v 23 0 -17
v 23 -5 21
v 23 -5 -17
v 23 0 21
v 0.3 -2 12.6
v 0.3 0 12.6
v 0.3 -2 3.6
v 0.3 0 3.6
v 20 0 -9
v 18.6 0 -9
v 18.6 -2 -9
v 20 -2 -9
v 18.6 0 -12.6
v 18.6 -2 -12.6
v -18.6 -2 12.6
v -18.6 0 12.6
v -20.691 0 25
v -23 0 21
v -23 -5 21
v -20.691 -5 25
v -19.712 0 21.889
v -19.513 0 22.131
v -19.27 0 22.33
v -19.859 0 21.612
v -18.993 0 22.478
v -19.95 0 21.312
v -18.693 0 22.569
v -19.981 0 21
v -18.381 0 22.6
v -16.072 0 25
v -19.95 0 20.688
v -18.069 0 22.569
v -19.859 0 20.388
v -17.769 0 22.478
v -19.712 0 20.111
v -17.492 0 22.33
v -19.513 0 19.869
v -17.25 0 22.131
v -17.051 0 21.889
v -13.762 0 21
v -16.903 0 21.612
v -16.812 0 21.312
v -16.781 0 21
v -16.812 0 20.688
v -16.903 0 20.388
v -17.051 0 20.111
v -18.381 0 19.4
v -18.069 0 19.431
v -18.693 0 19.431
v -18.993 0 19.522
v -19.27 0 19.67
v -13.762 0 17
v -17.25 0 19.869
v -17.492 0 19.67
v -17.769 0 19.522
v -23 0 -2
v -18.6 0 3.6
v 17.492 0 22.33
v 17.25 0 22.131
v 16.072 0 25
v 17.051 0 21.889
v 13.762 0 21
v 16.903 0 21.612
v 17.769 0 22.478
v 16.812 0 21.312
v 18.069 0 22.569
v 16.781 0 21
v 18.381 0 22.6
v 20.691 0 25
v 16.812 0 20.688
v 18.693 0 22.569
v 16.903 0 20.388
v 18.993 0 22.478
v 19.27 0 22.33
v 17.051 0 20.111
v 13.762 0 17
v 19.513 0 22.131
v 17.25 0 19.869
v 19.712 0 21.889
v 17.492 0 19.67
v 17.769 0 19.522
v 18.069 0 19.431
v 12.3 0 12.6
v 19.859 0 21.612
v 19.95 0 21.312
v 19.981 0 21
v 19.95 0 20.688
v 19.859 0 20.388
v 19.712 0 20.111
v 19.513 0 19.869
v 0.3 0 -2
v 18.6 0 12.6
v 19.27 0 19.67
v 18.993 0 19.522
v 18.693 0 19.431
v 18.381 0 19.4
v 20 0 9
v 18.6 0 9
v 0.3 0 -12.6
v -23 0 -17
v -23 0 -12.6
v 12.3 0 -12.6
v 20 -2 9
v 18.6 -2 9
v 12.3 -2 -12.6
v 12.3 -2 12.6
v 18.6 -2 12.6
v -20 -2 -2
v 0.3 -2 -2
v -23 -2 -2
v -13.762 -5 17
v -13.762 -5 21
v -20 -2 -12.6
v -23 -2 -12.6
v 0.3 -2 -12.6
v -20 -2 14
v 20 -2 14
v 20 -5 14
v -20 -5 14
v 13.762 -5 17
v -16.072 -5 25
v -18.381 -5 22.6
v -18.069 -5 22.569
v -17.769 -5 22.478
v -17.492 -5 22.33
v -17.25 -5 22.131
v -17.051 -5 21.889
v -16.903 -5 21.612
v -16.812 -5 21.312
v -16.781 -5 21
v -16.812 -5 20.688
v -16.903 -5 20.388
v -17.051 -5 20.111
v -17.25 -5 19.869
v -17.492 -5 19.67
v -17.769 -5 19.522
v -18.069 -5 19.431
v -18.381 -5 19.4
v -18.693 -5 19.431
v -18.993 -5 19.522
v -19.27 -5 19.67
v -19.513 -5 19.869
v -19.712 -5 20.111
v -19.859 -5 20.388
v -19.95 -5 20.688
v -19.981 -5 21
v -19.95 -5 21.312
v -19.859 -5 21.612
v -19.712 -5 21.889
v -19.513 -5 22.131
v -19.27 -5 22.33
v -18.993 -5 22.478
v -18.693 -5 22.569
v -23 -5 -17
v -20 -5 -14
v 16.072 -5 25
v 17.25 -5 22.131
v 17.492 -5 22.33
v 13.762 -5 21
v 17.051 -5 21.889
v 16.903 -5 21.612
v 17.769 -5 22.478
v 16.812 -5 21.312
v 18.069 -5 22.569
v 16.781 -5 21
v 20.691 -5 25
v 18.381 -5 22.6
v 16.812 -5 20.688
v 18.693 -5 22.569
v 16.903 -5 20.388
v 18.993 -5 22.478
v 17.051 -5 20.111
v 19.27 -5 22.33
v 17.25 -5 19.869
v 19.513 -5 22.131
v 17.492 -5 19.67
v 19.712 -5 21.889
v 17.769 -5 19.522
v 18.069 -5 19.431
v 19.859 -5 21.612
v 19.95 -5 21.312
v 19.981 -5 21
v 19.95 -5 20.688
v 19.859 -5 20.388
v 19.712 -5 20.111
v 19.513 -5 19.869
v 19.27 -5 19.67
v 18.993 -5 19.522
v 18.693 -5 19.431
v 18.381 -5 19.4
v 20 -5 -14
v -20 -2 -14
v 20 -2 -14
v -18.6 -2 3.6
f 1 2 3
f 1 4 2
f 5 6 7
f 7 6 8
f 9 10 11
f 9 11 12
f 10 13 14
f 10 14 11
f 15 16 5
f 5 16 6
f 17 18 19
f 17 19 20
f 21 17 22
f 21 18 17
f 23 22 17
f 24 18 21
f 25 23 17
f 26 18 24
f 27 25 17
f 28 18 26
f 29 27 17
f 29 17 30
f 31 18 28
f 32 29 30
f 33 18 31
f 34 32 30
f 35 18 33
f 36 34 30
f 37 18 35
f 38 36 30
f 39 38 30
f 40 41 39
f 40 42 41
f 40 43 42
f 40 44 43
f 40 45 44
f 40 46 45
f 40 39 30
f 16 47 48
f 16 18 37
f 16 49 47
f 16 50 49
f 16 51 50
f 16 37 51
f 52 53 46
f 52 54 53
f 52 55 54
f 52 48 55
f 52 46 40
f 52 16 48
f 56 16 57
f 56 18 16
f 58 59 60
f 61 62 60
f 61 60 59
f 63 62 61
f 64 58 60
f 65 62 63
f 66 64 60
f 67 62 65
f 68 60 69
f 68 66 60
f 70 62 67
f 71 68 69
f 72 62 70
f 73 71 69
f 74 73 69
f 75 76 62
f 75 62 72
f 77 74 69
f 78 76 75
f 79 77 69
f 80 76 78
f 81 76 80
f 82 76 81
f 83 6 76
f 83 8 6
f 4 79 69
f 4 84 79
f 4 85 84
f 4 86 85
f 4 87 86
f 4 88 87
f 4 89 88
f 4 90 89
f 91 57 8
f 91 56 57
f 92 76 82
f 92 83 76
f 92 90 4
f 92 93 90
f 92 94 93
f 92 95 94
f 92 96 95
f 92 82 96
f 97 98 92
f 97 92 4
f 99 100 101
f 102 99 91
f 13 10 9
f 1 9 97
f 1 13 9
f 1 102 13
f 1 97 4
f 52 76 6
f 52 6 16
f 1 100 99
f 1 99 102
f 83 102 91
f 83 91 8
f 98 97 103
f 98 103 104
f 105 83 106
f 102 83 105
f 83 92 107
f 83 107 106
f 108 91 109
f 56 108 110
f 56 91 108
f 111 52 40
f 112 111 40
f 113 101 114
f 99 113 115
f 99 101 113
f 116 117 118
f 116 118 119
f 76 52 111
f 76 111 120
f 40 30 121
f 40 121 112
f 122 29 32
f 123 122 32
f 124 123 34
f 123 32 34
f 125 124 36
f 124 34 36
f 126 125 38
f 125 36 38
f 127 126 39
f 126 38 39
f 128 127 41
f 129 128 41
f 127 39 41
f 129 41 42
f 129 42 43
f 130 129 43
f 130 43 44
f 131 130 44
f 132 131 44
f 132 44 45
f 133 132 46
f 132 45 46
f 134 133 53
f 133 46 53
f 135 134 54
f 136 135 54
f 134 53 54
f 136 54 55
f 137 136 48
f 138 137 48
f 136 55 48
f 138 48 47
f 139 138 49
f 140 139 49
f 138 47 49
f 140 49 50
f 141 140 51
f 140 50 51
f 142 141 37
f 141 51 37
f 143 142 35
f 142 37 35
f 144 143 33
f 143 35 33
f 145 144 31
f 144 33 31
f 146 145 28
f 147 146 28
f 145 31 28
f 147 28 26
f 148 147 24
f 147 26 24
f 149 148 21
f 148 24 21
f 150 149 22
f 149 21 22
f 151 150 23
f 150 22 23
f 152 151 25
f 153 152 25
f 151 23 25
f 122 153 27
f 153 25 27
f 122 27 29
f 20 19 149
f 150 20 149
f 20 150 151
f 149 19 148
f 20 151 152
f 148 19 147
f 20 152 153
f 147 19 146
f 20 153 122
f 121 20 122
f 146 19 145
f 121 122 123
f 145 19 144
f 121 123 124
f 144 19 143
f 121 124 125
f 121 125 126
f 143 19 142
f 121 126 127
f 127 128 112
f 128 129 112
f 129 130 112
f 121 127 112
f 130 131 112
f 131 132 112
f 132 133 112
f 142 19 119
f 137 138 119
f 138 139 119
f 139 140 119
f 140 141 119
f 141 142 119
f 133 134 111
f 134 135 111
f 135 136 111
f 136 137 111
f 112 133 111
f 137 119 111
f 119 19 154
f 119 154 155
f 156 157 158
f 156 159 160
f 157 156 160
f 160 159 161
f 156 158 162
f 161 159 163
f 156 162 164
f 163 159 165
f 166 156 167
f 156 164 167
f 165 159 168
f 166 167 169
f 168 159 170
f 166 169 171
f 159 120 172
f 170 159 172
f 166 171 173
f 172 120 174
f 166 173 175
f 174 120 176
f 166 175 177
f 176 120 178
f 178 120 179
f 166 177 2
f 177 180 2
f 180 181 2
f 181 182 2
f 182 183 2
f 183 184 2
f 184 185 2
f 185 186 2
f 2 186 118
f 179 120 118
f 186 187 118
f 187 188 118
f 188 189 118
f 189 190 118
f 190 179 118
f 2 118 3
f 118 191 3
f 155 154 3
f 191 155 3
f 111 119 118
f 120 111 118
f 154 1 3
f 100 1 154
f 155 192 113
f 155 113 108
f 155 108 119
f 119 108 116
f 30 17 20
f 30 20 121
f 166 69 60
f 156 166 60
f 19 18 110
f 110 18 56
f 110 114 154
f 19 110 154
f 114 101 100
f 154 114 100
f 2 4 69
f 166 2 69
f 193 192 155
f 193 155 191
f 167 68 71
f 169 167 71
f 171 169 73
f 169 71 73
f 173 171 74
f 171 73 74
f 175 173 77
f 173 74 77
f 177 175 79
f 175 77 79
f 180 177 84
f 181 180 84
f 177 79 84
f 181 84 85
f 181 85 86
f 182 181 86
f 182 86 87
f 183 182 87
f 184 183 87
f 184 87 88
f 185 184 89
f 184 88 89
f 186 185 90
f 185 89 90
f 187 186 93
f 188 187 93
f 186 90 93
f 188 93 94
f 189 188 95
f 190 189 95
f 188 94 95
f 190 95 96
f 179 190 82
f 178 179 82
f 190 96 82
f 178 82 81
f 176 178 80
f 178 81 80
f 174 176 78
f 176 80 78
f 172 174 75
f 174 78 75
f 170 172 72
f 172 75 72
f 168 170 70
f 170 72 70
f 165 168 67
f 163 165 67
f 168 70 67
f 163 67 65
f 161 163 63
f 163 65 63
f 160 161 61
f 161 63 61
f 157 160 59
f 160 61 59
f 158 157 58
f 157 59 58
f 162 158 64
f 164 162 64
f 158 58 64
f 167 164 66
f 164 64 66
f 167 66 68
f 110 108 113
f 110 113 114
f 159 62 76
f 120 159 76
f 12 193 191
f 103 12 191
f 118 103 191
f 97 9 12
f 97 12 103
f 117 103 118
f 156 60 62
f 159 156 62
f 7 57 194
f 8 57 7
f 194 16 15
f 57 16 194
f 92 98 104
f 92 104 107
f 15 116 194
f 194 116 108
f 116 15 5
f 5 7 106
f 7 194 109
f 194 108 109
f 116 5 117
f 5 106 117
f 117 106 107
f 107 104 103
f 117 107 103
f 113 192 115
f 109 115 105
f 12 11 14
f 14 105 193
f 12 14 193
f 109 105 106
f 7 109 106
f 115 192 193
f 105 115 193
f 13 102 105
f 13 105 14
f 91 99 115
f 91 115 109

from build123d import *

# Parameters (mm, degrees)
CROQUIS1_W              = 18.9
CROQUIS1_H              = 9
SALIENTE_EXTRUIR1_DEPTH = 2
SALIENTE_EXTRUIR2_DEPTH = 3
CROQUIS3_R              = 1.6
SALIENTE_EXTRUIR4_DEPTH = 5


with BuildPart() as part:
    # Croquis1 → Saliente-Extruir1 (new body)
    with BuildSketch(Plane(origin=(0, 0, 0), x_dir=(1, 0, 0), z_dir=(0, 1, 0))):
        Polygon((23, 17), (-23, 17), (-23, 12.6), (0.3, 12.6), (0.3, 2), (-23, 2), (-23, -17), (23, -17), align=None)
        Polygon((12.3, 12.6), (18.6, 12.6), (18.6, 9), (20, 9), (20, -9), (18.6, -9), (18.6, -12.6), (12.3, -12.6), align=None, mode=Mode.SUBTRACT)
        with Locations((-9.15, -8.1)):
            Rectangle(CROQUIS1_W, CROQUIS1_H, mode=Mode.SUBTRACT)
    extrude(amount=-SALIENTE_EXTRUIR1_DEPTH)

    # Croquis2 → Saliente-Extruir2 (add)
    with BuildSketch(Plane.XZ.offset(2)):
        Polygon((-23, -17), (-23, -12.6), (-23, -2), (-23, 17), (23, 17), (23, -17), align=None)
        Polygon((-20, -14), (20, -14), (20, 14), (-20, 14), (-20, -2), (-20, -12.6), align=None, mode=Mode.SUBTRACT)
    extrude(amount=SALIENTE_EXTRUIR2_DEPTH)

    # Croquis3 → Saliente-Extruir4 (add, through all)
    # profile 1 of 6: a face of its own
    with BuildSketch(Plane(origin=(0, 0, 0), x_dir=(1, 0, 0), z_dir=(0, 1, 0))):
        Polygon((-16.07179677, -25), (-13.762395693, -21), (-16.07179677, -17), (-20.690598923, -17), (-23, -21), (-20.690598923, -25), align=None)
        with Locations(Location((-18.381197846, -21, 0), (0, 0, 270))):
            Circle(CROQUIS3_R, mode=Mode.SUBTRACT)
    # profile 2 of 6: a face of its own
    with BuildSketch(Plane(origin=(0, 0, 0), x_dir=(1, 0, 0), z_dir=(0, 1, 0))):
        Polygon((16.07179677, -25), (13.762395693, -21), (16.07179677, -17), (20.690598923, -17), (23, -21), (20.690598923, -25), align=None)
        with Locations(Location((18.381197846, -21, 0), (0, 0, 270))):
            Circle(CROQUIS3_R, mode=Mode.SUBTRACT)
    # profile 3 of 6: a face of its own
    with BuildSketch(Plane(origin=(0, 0, 0), x_dir=(1, 0, 0), z_dir=(0, 1, 0))):
        Polygon((-23, -17), (-20.690598923, -17), (-23, -21), align=None)
    # profile 4 of 6: a face of its own
    with BuildSketch(Plane(origin=(0, 0, 0), x_dir=(1, 0, 0), z_dir=(0, 1, 0))):
        Polygon((-13.762395693, -21), (-16.07179677, -17), (-13.762395693, -17), align=None)
    # profile 5 of 6: a face of its own
    with BuildSketch(Plane(origin=(0, 0, 0), x_dir=(1, 0, 0), z_dir=(0, 1, 0))):
        Polygon((13.762395693, -17), (16.07179677, -17), (13.762395693, -21), align=None)
    # profile 6 of 6: a face of its own
    with BuildSketch(Plane(origin=(0, 0, 0), x_dir=(1, 0, 0), z_dir=(0, 1, 0))):
        Polygon((20.690598923, -17), (23, -17), (23, -21), align=None)
    extrude(amount=-SALIENTE_EXTRUIR4_DEPTH)


solid = part.part
